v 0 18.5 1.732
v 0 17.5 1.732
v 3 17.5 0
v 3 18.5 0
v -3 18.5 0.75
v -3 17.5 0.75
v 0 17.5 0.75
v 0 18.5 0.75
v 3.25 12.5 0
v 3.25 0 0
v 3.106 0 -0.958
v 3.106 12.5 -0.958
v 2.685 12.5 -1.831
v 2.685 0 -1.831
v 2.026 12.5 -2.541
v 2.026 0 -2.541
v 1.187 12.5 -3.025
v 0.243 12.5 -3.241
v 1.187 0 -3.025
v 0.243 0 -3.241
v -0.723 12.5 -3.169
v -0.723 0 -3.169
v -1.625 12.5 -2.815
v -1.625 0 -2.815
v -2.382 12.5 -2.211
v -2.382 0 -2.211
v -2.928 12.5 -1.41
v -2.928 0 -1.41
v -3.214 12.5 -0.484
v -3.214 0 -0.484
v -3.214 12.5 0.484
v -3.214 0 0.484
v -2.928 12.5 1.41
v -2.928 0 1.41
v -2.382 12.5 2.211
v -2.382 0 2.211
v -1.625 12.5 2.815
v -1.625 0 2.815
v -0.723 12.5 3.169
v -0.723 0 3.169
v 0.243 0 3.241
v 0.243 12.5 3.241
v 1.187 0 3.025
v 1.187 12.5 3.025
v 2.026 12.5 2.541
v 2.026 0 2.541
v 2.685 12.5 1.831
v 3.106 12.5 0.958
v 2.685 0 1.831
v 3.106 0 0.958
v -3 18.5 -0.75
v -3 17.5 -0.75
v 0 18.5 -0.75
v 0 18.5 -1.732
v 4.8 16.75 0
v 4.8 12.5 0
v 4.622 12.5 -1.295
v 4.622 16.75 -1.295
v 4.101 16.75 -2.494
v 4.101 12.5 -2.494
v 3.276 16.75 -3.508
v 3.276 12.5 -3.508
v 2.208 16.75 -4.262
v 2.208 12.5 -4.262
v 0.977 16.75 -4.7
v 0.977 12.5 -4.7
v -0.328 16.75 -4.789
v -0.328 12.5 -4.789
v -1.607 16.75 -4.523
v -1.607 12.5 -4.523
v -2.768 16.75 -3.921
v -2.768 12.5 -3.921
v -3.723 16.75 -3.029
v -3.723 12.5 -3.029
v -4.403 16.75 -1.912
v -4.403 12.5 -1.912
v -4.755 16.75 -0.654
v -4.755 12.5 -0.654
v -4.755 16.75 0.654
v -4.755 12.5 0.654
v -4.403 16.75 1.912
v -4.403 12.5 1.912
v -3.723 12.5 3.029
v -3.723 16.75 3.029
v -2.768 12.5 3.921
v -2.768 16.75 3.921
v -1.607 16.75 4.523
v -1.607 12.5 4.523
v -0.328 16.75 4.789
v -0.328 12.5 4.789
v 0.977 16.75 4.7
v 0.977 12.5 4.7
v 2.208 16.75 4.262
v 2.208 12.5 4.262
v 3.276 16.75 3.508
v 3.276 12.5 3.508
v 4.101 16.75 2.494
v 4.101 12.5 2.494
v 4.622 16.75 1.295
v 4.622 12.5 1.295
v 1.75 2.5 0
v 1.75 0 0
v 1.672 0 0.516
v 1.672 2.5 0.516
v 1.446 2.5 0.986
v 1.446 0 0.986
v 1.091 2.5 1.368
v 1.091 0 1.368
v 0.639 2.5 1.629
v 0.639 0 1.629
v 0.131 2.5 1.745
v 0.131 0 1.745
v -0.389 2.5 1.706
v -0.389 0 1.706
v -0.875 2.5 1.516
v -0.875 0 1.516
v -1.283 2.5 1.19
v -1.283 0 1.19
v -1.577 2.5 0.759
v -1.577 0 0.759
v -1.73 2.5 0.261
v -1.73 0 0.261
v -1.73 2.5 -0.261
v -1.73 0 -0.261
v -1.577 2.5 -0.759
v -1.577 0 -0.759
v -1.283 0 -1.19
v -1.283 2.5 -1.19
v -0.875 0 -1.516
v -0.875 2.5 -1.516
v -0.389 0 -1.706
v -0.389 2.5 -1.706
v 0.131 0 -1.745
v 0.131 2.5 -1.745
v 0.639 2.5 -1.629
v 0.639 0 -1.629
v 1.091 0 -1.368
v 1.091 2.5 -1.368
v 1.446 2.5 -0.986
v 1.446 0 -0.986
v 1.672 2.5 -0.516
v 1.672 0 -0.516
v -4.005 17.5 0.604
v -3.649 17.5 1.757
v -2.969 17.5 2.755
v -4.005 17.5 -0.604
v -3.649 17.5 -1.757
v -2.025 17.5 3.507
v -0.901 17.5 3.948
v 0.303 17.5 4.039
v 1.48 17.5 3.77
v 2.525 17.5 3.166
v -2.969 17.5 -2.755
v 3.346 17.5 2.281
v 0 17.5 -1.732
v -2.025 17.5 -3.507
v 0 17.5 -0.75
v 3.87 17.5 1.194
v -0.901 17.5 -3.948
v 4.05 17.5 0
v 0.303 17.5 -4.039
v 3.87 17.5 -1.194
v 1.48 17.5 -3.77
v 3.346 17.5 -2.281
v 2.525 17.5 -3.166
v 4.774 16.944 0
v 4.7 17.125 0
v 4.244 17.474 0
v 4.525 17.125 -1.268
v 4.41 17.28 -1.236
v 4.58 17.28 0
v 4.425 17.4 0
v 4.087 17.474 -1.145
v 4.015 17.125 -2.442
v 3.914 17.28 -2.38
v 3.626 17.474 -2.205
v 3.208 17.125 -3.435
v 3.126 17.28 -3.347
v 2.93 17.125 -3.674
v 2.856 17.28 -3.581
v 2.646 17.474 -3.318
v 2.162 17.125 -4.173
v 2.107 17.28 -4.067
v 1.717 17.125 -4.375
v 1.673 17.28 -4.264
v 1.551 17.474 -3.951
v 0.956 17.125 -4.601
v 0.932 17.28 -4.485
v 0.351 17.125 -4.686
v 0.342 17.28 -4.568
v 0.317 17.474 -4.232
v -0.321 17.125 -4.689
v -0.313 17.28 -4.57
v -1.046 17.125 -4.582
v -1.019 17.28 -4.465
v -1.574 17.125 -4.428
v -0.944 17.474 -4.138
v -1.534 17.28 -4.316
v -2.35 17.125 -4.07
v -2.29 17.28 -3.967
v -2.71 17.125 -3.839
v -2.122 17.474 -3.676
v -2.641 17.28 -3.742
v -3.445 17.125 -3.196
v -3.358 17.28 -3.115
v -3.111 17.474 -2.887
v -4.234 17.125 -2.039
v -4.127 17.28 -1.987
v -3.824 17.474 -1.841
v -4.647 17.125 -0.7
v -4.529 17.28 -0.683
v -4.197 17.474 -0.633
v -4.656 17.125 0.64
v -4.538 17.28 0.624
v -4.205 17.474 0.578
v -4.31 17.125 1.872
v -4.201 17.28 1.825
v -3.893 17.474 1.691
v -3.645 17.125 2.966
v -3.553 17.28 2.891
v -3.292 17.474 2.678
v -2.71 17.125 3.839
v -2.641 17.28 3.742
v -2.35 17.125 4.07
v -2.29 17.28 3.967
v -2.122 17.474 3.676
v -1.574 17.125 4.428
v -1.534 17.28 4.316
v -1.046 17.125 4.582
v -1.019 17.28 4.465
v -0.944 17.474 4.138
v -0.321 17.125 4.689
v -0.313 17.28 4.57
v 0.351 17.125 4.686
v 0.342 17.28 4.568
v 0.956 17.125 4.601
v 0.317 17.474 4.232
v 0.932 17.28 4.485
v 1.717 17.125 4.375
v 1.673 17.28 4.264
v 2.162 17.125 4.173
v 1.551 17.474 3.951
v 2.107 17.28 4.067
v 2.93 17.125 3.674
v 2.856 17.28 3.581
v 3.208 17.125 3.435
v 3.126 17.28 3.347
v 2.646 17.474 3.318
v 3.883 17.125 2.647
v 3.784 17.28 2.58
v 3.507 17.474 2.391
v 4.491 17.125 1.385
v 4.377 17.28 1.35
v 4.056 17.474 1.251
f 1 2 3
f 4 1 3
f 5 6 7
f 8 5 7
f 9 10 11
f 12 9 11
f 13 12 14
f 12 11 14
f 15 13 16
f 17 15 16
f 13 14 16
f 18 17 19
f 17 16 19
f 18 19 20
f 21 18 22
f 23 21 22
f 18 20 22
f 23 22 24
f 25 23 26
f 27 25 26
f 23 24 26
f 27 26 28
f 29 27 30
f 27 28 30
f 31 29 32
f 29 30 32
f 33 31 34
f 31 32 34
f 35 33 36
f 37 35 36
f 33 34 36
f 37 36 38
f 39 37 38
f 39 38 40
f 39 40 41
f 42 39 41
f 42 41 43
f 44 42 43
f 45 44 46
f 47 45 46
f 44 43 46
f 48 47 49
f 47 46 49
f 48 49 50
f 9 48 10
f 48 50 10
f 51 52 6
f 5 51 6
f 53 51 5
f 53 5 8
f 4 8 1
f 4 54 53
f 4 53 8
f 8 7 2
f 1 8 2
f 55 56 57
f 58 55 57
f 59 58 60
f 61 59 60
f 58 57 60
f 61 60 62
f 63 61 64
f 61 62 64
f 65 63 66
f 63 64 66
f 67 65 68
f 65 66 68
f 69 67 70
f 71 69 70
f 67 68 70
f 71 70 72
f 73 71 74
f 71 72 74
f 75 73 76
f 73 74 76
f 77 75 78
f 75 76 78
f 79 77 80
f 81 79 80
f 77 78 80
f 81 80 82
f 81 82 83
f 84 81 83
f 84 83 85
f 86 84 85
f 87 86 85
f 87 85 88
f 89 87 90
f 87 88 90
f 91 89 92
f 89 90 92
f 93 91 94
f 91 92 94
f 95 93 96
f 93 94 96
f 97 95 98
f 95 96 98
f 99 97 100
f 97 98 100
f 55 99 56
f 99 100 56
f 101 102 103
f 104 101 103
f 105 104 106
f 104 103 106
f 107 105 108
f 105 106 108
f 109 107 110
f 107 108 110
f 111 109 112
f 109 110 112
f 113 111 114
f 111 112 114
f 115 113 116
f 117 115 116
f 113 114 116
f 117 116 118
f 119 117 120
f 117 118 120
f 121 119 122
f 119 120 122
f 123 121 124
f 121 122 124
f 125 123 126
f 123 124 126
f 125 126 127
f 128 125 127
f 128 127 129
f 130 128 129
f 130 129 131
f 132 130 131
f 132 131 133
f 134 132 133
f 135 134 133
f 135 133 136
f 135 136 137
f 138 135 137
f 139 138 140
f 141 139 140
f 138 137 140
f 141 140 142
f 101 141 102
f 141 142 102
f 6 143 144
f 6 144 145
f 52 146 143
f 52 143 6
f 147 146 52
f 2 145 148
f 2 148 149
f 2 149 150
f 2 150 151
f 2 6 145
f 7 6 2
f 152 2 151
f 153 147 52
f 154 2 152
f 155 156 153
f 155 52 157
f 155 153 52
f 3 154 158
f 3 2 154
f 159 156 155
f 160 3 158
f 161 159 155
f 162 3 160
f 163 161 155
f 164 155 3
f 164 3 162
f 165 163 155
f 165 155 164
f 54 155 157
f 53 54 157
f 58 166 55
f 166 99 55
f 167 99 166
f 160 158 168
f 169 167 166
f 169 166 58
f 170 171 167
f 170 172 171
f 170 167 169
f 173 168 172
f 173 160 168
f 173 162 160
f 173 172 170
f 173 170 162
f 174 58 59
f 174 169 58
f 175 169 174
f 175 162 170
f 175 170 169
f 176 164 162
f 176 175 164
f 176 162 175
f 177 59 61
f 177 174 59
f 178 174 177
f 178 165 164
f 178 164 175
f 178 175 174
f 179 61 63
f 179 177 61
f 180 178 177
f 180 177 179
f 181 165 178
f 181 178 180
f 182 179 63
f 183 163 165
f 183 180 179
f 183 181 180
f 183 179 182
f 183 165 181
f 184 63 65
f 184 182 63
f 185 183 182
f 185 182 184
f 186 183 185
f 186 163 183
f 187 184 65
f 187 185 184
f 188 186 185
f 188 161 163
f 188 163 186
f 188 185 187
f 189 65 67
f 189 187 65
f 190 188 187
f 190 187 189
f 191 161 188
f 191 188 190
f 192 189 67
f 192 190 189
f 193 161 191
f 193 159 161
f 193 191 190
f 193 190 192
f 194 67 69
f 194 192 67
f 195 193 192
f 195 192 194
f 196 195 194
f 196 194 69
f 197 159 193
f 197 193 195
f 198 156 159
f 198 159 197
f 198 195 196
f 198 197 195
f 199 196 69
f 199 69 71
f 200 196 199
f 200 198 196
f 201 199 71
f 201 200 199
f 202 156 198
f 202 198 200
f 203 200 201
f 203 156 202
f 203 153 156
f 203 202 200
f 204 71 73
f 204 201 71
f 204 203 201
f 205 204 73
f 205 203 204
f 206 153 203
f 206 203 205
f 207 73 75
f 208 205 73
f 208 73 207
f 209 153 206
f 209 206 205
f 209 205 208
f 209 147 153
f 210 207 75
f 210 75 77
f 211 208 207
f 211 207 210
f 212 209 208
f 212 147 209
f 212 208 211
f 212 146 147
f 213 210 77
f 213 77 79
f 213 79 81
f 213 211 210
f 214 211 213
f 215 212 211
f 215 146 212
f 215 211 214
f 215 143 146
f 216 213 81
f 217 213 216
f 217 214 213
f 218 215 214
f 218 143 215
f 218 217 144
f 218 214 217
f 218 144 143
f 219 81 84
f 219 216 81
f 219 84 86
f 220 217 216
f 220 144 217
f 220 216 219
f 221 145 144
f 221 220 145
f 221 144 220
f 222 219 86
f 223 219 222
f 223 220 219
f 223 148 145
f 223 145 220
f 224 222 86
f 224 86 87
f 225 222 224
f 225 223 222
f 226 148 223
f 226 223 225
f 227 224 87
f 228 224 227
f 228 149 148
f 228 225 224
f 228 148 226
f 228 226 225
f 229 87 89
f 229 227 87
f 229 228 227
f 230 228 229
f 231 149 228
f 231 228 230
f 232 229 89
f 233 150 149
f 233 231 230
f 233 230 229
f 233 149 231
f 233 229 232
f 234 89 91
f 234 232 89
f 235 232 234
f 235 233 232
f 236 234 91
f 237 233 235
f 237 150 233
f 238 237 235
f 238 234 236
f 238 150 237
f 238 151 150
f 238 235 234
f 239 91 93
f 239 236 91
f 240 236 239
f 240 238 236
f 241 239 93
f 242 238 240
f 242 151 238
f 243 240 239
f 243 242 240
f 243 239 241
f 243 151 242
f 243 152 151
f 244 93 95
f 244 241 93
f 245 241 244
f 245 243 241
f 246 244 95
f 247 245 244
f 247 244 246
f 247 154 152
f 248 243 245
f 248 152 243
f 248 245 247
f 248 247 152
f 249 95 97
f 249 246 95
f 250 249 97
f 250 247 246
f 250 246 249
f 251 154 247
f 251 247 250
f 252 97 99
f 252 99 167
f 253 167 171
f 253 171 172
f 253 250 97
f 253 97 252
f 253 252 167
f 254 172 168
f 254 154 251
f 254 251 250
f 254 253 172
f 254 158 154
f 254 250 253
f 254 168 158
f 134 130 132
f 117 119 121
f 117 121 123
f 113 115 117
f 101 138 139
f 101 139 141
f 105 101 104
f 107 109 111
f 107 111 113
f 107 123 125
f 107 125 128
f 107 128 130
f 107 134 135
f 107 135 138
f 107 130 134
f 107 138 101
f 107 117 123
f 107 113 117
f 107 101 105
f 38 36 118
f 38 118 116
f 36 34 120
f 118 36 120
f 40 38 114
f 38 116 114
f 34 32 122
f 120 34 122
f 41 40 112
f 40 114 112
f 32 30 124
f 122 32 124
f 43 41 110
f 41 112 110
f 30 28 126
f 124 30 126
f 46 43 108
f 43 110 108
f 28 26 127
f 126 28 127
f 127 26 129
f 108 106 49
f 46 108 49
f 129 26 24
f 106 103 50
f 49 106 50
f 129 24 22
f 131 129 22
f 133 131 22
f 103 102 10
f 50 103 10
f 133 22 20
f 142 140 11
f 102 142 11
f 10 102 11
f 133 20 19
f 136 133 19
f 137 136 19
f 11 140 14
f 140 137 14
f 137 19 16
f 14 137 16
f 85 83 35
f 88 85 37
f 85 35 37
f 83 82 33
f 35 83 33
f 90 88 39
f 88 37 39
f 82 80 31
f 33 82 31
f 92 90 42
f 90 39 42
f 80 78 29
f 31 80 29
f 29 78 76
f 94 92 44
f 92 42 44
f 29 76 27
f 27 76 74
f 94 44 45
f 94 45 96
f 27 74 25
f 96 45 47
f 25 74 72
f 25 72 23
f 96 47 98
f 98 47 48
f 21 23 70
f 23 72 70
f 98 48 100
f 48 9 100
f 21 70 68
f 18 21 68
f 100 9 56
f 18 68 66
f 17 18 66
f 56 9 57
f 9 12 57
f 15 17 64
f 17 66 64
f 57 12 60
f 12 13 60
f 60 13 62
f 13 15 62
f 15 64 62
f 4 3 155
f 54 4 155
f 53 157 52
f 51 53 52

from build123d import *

# Parameters (mm, degrees)
SKETCH1_R           = 3.25
BOSS_EXTRUDE1_DEPTH = 12.5
SKETCH2_R           = 1.75
CUT_EXTRUDE1_DEPTH  = 2.5
SKETCH6_R           = 4.8
BOSS_EXTRUDE2_DEPTH = 5
FILLET1_R           = 0.75
BOSS_EXTRUDE3_DEPTH = 1


with BuildPart() as part:
    # Sketch1 → Boss-Extrude1 (new body)
    with BuildSketch(Plane(origin=(0, 0, 0), x_dir=(1, 0, 0), z_dir=(0, 1, 0))):
        Circle(SKETCH1_R)
    extrude(amount=BOSS_EXTRUDE1_DEPTH)

    # Sketch2 → Cut-Extrude1 (cut)
    with BuildSketch(Plane.XZ):
        Circle(SKETCH2_R)
    extrude(amount=-CUT_EXTRUDE1_DEPTH, mode=Mode.SUBTRACT)

    # Sketch6 → Boss-Extrude2 (add)
    with BuildSketch(Plane(origin=(0, 12.5, 0), x_dir=(1, 0, 0), z_dir=(0, 1, 0))):
        Circle(SKETCH6_R)
    extrude(amount=BOSS_EXTRUDE2_DEPTH)

    # Fillet1
    fillet1_edges = [part.edges().sort_by_distance(p)[0] for p in [
        (-4.8, 17.5, 0),
    ]]
    fillet(fillet1_edges, radius=FILLET1_R)

    # Sketch8 → Boss-Extrude3 (add)
    with BuildSketch(Plane(origin=(0, 17.5, 0), x_dir=(1, 0, 0), z_dir=(0, 1, 0))):
        Polygon((0, 0.75), (-3, 0.75), (-3, -0.75), (0, -0.75), (0, -1.732050808), (3, 0), (0, 1.732050808), align=None)
    extrude(amount=BOSS_EXTRUDE3_DEPTH)


solid = part.part
